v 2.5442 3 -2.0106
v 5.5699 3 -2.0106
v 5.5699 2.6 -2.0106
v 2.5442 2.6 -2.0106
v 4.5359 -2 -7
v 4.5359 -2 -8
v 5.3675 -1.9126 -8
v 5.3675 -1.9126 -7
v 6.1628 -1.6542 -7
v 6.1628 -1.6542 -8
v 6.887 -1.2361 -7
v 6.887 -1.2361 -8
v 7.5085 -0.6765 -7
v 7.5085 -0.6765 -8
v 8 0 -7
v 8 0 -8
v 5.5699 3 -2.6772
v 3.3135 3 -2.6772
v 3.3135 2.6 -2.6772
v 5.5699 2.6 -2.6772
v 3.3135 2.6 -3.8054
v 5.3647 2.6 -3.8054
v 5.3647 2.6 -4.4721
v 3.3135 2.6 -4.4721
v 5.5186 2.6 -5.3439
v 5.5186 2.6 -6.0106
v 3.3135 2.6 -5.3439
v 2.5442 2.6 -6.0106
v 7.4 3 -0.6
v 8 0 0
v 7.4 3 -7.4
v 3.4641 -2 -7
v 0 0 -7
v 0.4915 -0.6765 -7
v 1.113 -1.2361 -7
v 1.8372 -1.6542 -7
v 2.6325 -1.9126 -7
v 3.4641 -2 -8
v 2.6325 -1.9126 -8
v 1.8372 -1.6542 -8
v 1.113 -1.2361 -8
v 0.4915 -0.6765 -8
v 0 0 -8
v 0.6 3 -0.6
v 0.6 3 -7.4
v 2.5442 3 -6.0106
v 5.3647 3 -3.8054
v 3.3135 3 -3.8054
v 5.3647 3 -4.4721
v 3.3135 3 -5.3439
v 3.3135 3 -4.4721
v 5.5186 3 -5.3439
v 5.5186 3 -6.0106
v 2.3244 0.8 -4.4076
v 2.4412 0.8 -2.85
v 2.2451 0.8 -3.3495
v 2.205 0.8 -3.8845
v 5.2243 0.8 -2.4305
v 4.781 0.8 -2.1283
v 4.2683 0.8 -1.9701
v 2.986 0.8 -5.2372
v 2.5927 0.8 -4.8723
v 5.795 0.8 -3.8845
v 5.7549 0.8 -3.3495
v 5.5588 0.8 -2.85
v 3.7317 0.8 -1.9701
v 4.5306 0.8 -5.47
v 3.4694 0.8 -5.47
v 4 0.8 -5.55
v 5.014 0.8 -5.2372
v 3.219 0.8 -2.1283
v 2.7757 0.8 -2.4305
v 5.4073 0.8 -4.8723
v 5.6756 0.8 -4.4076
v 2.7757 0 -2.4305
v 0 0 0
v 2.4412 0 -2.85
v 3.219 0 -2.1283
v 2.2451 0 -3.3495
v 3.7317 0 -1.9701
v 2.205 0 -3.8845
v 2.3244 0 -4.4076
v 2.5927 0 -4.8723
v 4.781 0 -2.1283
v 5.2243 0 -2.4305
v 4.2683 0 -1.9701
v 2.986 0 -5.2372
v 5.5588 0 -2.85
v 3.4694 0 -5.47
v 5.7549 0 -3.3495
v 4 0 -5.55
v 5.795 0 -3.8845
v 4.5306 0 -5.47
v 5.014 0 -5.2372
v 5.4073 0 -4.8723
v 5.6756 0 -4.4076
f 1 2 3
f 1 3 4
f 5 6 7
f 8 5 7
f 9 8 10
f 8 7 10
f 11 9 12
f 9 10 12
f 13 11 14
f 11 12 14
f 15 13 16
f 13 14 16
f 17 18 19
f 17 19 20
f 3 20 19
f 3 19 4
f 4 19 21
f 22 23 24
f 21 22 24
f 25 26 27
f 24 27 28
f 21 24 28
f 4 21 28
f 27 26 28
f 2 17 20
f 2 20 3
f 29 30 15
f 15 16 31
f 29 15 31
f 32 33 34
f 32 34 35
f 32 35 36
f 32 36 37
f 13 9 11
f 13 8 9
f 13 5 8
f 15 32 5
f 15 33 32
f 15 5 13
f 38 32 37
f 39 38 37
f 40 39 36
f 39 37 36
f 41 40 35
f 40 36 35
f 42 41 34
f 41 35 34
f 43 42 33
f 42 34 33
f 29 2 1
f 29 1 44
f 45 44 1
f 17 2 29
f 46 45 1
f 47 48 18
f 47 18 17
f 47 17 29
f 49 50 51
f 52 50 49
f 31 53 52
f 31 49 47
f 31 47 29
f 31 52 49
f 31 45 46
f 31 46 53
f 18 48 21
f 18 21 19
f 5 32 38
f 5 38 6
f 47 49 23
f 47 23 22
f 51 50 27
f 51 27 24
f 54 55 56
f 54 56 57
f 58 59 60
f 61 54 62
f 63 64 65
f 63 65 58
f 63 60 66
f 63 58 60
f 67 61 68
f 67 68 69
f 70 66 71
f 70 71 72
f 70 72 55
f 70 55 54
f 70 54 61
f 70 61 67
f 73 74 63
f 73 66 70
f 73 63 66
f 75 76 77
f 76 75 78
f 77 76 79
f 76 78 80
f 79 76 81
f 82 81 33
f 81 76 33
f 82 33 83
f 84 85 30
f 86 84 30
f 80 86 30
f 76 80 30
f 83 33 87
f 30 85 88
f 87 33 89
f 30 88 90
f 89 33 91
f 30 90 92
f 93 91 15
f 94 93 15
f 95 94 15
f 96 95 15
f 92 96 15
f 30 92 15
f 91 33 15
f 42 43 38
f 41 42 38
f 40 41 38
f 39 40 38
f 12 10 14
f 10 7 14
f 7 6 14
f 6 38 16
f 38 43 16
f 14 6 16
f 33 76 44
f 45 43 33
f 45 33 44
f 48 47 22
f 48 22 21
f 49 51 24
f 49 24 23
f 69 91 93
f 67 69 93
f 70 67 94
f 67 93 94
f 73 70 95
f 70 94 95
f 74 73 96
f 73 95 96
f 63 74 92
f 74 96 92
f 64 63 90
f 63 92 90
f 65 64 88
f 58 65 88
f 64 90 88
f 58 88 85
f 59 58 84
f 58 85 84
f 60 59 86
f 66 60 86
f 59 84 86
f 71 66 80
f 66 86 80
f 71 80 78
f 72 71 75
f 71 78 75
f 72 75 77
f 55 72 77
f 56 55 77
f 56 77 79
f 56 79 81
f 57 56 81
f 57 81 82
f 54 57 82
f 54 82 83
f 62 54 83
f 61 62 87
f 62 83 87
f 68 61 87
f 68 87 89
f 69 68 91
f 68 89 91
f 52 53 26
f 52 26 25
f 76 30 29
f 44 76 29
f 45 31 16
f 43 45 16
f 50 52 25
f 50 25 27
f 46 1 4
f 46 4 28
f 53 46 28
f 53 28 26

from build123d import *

# Parameters (mm, degrees)
SKETCH1_W               = 8
SKETCH1_H               = 8
BOSS_EXTRUDE1_DEPTH     = 3
CUT_EXTRUDE1_DEPTH      = 12.704699911
CUT_EXTRUDE1_DEPTH_BACK = 12.704699911
CUT_EXTRUDE2_DEPTH      = 11
SKETCH4_R               = 1.8
CUT_EXTRUDE3_DEPTH      = 0.8
SKETCH5_W               = 8
SKETCH5_H               = 1
BOSS_EXTRUDE2_DEPTH     = 2
FILLET1_R               = 4
CUT_EXTRUDE4_DEPTH      = 0.4


with BuildPart() as part:
    # Sketch1 → Boss-Extrude1 (new body)
    with BuildSketch(Plane(origin=(0, 0, 0), x_dir=(1, 0, 0), z_dir=(0, 1, 0))):
        with Locations((4, 4)):
            Rectangle(SKETCH1_W, SKETCH1_H)
    extrude(amount=BOSS_EXTRUDE1_DEPTH)

    # Sketch2 → Cut-Extrude1 (cut, two sides: drawn at the far end of the back side and taken through both)
    with BuildSketch(Plane.XY.offset(-CUT_EXTRUDE1_DEPTH_BACK)):
        Polygon((0, 0), (0.6, 3), (0, 3), align=None)
        Polygon((8, 0), (7.4, 3), (8, 3), align=None)
    extrude(amount=CUT_EXTRUDE1_DEPTH + CUT_EXTRUDE1_DEPTH_BACK, mode=Mode.SUBTRACT)

    # Sketch3 → Cut-Extrude2 (cut)
    with BuildSketch(Plane(origin=(0, 0, 0), x_dir=(0, 0, -1), z_dir=(1, 0, 0))):
        Polygon((0, 0), (0.6, 3), (0, 3), align=None)
        Polygon((8, 3), (7.4, 3), (8, 0), align=None)
    extrude(amount=CUT_EXTRUDE2_DEPTH, mode=Mode.SUBTRACT)

    # Sketch4 → Cut-Extrude3 (cut)
    with BuildSketch(Plane.XZ):
        with Locations(Location((4, -3.75, 0), (0, 0, 270))):
            Circle(SKETCH4_R)
    extrude(amount=-CUT_EXTRUDE3_DEPTH, mode=Mode.SUBTRACT)

    # Sketch5 → Boss-Extrude2 (add)
    with BuildSketch(Plane.XZ):
        with Locations((4, -7.5)):
            Rectangle(SKETCH5_W, SKETCH5_H)
    extrude(amount=BOSS_EXTRUDE2_DEPTH)

    # Fillet1
    # the kernel refuses this fillet: 4 mm, written as the material it takes off along each edge
    with BuildSketch(Plane(origin=(8, -2, -16.660254038), x_dir=(0, 1, 0), z_dir=(0, 0, 1)), Plane(origin=(0, -2, 1.660254038), x_dir=(0, 1, 0), z_dir=(0, 0, -1))) as fillet1_piece_1:
        with BuildLine():
            CenterArc((4, 3.464101615), FILLET1_R, 180, 60)
            Line((0, 3.464101615), (-0.08, 3.464101615))
            Line((-0.08, 3.464101615), (-0.08, 0))
            Line((-0.08, 0), (0, -0.08))
            ThreePointArc((0, -0.08), (1, -0.08), (1.96, -0.069282032))
            Line((1.96, -0.069282032), (2, 0))
        make_face()
    extrude(amount=18.320508076, mode=Mode.SUBTRACT)

    # Sketch6 → Cut-Extrude4 (cut)
    with BuildSketch(Plane(origin=(0, 3, 0), x_dir=(1, 0, 0), z_dir=(0, 1, 0))):
        Polygon((2.544225106, 2.010567225), (2.544225106, 6.010567225), (5.51858408, 6.010567225), (5.51858408, 5.343900558), (3.313455875, 5.343900558), (3.313455875, 4.472105686), (5.364737926, 4.472105686), (5.364737926, 3.80543902), (3.313455875, 3.80543902), (3.313455875, 2.677233891), (5.569866131, 2.677233891), (5.569866131, 2.010567225), align=None)
    extrude(amount=-CUT_EXTRUDE4_DEPTH, mode=Mode.SUBTRACT)


solid = part.part
